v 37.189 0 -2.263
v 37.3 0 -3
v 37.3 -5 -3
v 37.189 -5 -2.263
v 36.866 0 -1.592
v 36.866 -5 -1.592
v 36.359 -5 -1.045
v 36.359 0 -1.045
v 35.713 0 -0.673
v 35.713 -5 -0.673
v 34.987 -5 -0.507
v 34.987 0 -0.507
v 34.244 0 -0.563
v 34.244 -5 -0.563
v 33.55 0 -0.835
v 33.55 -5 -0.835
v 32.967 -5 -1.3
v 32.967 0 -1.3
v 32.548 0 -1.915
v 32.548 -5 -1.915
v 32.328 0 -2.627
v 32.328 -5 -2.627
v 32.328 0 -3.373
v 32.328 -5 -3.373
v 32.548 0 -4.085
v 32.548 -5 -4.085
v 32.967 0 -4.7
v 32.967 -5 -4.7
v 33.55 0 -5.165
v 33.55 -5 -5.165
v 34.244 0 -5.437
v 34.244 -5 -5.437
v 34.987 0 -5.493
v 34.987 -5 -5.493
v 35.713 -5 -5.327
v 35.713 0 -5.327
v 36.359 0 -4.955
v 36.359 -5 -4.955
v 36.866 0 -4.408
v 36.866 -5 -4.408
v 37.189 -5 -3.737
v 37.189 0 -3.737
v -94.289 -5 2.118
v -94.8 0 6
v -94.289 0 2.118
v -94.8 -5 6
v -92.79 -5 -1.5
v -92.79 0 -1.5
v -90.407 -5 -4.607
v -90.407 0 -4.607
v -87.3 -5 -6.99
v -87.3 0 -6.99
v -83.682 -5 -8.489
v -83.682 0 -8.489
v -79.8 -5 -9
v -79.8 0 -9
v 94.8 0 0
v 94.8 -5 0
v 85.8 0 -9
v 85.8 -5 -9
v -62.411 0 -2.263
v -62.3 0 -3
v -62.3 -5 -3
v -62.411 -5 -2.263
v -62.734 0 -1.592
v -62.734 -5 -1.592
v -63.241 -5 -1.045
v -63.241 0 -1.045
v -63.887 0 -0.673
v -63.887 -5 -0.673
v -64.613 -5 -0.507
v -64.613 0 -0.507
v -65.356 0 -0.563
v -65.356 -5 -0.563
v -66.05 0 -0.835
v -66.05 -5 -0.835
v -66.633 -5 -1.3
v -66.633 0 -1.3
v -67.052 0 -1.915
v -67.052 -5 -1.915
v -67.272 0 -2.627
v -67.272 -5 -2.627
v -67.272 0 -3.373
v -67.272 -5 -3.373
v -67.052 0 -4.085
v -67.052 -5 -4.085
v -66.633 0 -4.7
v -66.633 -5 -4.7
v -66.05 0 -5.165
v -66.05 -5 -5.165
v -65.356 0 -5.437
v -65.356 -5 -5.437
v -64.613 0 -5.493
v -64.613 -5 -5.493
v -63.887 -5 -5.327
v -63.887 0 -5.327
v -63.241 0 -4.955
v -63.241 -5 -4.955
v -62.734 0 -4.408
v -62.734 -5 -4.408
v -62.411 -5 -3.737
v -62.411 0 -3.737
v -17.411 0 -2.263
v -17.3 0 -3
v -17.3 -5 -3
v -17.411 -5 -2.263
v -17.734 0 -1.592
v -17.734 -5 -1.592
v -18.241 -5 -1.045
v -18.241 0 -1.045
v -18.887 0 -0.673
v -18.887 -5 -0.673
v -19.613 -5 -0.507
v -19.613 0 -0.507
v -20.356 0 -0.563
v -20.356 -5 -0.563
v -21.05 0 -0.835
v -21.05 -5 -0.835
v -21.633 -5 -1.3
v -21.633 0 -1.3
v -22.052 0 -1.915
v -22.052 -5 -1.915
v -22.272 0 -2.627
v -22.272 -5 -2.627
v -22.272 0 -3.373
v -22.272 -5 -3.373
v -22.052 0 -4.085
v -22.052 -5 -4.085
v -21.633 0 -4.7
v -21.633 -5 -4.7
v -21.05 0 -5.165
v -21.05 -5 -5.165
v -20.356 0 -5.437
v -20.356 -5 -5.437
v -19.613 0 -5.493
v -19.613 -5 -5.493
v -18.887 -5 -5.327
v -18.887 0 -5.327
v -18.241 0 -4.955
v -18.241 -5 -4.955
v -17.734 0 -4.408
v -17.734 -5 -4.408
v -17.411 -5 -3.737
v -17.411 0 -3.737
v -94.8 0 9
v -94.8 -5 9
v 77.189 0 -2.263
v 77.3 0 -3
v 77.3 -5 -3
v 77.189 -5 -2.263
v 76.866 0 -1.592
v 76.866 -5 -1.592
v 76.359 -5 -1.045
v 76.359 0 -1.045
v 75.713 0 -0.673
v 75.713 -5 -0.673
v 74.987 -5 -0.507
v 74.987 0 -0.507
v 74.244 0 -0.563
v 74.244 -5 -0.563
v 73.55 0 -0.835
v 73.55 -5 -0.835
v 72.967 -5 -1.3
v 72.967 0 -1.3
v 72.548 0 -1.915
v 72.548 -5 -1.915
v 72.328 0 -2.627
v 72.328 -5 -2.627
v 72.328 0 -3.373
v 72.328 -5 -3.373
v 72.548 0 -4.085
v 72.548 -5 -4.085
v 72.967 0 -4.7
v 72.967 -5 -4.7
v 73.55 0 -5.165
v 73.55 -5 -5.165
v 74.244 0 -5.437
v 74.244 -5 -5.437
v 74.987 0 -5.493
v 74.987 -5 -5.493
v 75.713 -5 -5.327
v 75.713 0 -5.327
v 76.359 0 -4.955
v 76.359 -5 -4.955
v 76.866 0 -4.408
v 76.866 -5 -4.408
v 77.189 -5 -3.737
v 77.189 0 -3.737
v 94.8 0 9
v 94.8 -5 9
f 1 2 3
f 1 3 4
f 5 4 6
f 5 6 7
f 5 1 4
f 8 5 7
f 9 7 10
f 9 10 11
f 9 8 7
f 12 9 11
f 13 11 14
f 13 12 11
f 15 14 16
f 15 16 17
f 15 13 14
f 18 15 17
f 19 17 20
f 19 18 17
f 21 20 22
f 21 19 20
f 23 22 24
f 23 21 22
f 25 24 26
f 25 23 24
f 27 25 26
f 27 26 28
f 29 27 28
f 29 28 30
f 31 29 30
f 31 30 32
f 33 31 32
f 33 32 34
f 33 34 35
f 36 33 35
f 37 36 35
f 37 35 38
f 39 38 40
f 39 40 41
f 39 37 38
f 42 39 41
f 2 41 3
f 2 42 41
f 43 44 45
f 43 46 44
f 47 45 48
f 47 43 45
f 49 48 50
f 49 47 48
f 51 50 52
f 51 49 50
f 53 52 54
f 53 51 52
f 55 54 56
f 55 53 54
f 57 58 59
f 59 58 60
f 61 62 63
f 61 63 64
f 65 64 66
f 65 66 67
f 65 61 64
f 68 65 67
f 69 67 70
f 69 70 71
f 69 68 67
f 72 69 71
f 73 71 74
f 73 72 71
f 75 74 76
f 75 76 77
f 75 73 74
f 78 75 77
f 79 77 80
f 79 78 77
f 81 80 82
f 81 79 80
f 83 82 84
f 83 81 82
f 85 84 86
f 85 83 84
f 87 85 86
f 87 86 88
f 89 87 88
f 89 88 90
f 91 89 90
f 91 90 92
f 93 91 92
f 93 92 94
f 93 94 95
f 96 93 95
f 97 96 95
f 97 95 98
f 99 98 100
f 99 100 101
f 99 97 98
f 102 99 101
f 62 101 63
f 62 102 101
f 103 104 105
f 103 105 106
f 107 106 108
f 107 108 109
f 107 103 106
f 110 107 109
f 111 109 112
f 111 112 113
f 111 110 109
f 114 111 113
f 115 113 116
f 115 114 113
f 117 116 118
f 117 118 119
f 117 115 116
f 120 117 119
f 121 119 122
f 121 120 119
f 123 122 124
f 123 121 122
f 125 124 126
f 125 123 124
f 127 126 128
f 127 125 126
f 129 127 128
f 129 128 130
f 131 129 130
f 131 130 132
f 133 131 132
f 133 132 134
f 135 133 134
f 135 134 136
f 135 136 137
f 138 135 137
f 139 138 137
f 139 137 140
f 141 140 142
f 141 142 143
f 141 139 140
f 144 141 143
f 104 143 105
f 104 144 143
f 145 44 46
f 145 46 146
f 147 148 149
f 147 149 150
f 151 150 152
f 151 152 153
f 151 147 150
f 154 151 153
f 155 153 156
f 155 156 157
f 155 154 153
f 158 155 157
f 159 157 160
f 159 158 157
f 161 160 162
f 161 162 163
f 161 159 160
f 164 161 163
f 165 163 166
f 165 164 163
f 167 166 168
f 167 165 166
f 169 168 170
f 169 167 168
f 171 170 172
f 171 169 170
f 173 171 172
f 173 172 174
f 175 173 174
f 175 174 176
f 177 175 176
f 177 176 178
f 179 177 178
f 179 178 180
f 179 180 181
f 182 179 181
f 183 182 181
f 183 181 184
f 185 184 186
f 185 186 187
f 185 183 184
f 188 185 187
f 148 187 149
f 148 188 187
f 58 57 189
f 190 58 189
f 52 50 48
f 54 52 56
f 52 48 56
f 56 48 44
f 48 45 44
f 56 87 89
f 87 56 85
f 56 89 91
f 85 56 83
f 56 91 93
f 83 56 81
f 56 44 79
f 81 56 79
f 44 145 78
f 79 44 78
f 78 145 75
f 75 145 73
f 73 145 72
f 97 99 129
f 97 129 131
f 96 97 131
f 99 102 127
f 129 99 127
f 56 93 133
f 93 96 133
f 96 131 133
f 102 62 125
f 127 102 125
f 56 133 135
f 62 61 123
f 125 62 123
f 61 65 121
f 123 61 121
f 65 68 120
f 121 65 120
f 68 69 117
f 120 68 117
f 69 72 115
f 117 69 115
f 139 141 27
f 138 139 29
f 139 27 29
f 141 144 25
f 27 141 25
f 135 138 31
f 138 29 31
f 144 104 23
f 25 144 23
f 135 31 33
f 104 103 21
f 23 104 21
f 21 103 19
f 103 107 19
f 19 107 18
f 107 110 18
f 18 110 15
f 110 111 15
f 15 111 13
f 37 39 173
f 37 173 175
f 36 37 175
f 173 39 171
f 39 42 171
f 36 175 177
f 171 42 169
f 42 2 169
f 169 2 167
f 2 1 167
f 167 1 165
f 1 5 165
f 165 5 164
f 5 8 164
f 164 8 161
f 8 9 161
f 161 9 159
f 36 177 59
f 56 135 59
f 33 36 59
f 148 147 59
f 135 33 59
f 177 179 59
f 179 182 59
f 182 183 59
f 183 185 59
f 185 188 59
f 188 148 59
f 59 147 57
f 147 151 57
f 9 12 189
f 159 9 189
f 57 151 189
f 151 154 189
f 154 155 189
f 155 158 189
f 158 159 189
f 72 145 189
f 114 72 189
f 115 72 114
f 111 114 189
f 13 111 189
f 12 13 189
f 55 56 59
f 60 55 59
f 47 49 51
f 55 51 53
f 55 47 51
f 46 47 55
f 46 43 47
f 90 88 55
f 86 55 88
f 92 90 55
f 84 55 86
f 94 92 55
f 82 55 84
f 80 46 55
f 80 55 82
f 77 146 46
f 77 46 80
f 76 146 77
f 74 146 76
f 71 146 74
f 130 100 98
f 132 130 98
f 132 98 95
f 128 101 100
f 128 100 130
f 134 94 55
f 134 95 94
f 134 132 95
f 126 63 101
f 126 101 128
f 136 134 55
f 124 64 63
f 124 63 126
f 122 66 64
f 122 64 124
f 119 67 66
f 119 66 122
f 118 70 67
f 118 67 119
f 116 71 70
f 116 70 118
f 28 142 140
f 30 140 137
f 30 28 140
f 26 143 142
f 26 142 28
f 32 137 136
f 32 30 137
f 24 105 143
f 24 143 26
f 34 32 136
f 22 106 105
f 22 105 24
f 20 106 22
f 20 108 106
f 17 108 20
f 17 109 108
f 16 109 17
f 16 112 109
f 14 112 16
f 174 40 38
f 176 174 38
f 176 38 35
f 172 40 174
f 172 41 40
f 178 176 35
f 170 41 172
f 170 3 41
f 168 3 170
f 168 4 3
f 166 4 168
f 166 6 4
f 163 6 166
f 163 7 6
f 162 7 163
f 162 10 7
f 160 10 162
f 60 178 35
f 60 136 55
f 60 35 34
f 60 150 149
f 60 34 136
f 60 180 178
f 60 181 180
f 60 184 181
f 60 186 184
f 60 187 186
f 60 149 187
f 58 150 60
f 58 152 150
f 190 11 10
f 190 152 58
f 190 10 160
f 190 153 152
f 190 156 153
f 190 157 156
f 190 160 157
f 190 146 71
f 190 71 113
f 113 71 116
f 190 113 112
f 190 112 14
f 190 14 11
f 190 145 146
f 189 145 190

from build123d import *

# Parameters (mm, degrees)
F0_W     = 189.6
F0_H     = 18
F0_R     = 2.5
F1_DEPTH = 5
F3_DEPTH = 25
F4_R     = 15


with BuildPart() as f1:
    # F0 (on Front) → F1 (new body)
    with BuildSketch(Plane.XZ):
        Rectangle(F0_W, F0_H)
        with Locations((-64.8, -3)):
            Circle(F0_R, mode=Mode.SUBTRACT)
        with Locations((-19.8, -3)):
            Circle(F0_R, mode=Mode.SUBTRACT)
        with Locations((34.8, -3)):
            Circle(F0_R, mode=Mode.SUBTRACT)
        with Locations((74.8, -3)):
            Circle(F0_R, mode=Mode.SUBTRACT)
    extrude(amount=F1_DEPTH)

    # F2 (on face) → F3 (cut)
    with BuildSketch(Plane.XZ.offset(5)):
        Polygon((94.8, -9), (94.8, 0), (85.8, -9), align=None)
    extrude(amount=-F3_DEPTH, mode=Mode.SUBTRACT)

    # F4
    f4_edges = [f1.edges().sort_by_distance(p)[0] for p in [
        (-94.8, -2.5, -9),
    ]]
    fillet(f4_edges, radius=F4_R)


solid = f1.part
